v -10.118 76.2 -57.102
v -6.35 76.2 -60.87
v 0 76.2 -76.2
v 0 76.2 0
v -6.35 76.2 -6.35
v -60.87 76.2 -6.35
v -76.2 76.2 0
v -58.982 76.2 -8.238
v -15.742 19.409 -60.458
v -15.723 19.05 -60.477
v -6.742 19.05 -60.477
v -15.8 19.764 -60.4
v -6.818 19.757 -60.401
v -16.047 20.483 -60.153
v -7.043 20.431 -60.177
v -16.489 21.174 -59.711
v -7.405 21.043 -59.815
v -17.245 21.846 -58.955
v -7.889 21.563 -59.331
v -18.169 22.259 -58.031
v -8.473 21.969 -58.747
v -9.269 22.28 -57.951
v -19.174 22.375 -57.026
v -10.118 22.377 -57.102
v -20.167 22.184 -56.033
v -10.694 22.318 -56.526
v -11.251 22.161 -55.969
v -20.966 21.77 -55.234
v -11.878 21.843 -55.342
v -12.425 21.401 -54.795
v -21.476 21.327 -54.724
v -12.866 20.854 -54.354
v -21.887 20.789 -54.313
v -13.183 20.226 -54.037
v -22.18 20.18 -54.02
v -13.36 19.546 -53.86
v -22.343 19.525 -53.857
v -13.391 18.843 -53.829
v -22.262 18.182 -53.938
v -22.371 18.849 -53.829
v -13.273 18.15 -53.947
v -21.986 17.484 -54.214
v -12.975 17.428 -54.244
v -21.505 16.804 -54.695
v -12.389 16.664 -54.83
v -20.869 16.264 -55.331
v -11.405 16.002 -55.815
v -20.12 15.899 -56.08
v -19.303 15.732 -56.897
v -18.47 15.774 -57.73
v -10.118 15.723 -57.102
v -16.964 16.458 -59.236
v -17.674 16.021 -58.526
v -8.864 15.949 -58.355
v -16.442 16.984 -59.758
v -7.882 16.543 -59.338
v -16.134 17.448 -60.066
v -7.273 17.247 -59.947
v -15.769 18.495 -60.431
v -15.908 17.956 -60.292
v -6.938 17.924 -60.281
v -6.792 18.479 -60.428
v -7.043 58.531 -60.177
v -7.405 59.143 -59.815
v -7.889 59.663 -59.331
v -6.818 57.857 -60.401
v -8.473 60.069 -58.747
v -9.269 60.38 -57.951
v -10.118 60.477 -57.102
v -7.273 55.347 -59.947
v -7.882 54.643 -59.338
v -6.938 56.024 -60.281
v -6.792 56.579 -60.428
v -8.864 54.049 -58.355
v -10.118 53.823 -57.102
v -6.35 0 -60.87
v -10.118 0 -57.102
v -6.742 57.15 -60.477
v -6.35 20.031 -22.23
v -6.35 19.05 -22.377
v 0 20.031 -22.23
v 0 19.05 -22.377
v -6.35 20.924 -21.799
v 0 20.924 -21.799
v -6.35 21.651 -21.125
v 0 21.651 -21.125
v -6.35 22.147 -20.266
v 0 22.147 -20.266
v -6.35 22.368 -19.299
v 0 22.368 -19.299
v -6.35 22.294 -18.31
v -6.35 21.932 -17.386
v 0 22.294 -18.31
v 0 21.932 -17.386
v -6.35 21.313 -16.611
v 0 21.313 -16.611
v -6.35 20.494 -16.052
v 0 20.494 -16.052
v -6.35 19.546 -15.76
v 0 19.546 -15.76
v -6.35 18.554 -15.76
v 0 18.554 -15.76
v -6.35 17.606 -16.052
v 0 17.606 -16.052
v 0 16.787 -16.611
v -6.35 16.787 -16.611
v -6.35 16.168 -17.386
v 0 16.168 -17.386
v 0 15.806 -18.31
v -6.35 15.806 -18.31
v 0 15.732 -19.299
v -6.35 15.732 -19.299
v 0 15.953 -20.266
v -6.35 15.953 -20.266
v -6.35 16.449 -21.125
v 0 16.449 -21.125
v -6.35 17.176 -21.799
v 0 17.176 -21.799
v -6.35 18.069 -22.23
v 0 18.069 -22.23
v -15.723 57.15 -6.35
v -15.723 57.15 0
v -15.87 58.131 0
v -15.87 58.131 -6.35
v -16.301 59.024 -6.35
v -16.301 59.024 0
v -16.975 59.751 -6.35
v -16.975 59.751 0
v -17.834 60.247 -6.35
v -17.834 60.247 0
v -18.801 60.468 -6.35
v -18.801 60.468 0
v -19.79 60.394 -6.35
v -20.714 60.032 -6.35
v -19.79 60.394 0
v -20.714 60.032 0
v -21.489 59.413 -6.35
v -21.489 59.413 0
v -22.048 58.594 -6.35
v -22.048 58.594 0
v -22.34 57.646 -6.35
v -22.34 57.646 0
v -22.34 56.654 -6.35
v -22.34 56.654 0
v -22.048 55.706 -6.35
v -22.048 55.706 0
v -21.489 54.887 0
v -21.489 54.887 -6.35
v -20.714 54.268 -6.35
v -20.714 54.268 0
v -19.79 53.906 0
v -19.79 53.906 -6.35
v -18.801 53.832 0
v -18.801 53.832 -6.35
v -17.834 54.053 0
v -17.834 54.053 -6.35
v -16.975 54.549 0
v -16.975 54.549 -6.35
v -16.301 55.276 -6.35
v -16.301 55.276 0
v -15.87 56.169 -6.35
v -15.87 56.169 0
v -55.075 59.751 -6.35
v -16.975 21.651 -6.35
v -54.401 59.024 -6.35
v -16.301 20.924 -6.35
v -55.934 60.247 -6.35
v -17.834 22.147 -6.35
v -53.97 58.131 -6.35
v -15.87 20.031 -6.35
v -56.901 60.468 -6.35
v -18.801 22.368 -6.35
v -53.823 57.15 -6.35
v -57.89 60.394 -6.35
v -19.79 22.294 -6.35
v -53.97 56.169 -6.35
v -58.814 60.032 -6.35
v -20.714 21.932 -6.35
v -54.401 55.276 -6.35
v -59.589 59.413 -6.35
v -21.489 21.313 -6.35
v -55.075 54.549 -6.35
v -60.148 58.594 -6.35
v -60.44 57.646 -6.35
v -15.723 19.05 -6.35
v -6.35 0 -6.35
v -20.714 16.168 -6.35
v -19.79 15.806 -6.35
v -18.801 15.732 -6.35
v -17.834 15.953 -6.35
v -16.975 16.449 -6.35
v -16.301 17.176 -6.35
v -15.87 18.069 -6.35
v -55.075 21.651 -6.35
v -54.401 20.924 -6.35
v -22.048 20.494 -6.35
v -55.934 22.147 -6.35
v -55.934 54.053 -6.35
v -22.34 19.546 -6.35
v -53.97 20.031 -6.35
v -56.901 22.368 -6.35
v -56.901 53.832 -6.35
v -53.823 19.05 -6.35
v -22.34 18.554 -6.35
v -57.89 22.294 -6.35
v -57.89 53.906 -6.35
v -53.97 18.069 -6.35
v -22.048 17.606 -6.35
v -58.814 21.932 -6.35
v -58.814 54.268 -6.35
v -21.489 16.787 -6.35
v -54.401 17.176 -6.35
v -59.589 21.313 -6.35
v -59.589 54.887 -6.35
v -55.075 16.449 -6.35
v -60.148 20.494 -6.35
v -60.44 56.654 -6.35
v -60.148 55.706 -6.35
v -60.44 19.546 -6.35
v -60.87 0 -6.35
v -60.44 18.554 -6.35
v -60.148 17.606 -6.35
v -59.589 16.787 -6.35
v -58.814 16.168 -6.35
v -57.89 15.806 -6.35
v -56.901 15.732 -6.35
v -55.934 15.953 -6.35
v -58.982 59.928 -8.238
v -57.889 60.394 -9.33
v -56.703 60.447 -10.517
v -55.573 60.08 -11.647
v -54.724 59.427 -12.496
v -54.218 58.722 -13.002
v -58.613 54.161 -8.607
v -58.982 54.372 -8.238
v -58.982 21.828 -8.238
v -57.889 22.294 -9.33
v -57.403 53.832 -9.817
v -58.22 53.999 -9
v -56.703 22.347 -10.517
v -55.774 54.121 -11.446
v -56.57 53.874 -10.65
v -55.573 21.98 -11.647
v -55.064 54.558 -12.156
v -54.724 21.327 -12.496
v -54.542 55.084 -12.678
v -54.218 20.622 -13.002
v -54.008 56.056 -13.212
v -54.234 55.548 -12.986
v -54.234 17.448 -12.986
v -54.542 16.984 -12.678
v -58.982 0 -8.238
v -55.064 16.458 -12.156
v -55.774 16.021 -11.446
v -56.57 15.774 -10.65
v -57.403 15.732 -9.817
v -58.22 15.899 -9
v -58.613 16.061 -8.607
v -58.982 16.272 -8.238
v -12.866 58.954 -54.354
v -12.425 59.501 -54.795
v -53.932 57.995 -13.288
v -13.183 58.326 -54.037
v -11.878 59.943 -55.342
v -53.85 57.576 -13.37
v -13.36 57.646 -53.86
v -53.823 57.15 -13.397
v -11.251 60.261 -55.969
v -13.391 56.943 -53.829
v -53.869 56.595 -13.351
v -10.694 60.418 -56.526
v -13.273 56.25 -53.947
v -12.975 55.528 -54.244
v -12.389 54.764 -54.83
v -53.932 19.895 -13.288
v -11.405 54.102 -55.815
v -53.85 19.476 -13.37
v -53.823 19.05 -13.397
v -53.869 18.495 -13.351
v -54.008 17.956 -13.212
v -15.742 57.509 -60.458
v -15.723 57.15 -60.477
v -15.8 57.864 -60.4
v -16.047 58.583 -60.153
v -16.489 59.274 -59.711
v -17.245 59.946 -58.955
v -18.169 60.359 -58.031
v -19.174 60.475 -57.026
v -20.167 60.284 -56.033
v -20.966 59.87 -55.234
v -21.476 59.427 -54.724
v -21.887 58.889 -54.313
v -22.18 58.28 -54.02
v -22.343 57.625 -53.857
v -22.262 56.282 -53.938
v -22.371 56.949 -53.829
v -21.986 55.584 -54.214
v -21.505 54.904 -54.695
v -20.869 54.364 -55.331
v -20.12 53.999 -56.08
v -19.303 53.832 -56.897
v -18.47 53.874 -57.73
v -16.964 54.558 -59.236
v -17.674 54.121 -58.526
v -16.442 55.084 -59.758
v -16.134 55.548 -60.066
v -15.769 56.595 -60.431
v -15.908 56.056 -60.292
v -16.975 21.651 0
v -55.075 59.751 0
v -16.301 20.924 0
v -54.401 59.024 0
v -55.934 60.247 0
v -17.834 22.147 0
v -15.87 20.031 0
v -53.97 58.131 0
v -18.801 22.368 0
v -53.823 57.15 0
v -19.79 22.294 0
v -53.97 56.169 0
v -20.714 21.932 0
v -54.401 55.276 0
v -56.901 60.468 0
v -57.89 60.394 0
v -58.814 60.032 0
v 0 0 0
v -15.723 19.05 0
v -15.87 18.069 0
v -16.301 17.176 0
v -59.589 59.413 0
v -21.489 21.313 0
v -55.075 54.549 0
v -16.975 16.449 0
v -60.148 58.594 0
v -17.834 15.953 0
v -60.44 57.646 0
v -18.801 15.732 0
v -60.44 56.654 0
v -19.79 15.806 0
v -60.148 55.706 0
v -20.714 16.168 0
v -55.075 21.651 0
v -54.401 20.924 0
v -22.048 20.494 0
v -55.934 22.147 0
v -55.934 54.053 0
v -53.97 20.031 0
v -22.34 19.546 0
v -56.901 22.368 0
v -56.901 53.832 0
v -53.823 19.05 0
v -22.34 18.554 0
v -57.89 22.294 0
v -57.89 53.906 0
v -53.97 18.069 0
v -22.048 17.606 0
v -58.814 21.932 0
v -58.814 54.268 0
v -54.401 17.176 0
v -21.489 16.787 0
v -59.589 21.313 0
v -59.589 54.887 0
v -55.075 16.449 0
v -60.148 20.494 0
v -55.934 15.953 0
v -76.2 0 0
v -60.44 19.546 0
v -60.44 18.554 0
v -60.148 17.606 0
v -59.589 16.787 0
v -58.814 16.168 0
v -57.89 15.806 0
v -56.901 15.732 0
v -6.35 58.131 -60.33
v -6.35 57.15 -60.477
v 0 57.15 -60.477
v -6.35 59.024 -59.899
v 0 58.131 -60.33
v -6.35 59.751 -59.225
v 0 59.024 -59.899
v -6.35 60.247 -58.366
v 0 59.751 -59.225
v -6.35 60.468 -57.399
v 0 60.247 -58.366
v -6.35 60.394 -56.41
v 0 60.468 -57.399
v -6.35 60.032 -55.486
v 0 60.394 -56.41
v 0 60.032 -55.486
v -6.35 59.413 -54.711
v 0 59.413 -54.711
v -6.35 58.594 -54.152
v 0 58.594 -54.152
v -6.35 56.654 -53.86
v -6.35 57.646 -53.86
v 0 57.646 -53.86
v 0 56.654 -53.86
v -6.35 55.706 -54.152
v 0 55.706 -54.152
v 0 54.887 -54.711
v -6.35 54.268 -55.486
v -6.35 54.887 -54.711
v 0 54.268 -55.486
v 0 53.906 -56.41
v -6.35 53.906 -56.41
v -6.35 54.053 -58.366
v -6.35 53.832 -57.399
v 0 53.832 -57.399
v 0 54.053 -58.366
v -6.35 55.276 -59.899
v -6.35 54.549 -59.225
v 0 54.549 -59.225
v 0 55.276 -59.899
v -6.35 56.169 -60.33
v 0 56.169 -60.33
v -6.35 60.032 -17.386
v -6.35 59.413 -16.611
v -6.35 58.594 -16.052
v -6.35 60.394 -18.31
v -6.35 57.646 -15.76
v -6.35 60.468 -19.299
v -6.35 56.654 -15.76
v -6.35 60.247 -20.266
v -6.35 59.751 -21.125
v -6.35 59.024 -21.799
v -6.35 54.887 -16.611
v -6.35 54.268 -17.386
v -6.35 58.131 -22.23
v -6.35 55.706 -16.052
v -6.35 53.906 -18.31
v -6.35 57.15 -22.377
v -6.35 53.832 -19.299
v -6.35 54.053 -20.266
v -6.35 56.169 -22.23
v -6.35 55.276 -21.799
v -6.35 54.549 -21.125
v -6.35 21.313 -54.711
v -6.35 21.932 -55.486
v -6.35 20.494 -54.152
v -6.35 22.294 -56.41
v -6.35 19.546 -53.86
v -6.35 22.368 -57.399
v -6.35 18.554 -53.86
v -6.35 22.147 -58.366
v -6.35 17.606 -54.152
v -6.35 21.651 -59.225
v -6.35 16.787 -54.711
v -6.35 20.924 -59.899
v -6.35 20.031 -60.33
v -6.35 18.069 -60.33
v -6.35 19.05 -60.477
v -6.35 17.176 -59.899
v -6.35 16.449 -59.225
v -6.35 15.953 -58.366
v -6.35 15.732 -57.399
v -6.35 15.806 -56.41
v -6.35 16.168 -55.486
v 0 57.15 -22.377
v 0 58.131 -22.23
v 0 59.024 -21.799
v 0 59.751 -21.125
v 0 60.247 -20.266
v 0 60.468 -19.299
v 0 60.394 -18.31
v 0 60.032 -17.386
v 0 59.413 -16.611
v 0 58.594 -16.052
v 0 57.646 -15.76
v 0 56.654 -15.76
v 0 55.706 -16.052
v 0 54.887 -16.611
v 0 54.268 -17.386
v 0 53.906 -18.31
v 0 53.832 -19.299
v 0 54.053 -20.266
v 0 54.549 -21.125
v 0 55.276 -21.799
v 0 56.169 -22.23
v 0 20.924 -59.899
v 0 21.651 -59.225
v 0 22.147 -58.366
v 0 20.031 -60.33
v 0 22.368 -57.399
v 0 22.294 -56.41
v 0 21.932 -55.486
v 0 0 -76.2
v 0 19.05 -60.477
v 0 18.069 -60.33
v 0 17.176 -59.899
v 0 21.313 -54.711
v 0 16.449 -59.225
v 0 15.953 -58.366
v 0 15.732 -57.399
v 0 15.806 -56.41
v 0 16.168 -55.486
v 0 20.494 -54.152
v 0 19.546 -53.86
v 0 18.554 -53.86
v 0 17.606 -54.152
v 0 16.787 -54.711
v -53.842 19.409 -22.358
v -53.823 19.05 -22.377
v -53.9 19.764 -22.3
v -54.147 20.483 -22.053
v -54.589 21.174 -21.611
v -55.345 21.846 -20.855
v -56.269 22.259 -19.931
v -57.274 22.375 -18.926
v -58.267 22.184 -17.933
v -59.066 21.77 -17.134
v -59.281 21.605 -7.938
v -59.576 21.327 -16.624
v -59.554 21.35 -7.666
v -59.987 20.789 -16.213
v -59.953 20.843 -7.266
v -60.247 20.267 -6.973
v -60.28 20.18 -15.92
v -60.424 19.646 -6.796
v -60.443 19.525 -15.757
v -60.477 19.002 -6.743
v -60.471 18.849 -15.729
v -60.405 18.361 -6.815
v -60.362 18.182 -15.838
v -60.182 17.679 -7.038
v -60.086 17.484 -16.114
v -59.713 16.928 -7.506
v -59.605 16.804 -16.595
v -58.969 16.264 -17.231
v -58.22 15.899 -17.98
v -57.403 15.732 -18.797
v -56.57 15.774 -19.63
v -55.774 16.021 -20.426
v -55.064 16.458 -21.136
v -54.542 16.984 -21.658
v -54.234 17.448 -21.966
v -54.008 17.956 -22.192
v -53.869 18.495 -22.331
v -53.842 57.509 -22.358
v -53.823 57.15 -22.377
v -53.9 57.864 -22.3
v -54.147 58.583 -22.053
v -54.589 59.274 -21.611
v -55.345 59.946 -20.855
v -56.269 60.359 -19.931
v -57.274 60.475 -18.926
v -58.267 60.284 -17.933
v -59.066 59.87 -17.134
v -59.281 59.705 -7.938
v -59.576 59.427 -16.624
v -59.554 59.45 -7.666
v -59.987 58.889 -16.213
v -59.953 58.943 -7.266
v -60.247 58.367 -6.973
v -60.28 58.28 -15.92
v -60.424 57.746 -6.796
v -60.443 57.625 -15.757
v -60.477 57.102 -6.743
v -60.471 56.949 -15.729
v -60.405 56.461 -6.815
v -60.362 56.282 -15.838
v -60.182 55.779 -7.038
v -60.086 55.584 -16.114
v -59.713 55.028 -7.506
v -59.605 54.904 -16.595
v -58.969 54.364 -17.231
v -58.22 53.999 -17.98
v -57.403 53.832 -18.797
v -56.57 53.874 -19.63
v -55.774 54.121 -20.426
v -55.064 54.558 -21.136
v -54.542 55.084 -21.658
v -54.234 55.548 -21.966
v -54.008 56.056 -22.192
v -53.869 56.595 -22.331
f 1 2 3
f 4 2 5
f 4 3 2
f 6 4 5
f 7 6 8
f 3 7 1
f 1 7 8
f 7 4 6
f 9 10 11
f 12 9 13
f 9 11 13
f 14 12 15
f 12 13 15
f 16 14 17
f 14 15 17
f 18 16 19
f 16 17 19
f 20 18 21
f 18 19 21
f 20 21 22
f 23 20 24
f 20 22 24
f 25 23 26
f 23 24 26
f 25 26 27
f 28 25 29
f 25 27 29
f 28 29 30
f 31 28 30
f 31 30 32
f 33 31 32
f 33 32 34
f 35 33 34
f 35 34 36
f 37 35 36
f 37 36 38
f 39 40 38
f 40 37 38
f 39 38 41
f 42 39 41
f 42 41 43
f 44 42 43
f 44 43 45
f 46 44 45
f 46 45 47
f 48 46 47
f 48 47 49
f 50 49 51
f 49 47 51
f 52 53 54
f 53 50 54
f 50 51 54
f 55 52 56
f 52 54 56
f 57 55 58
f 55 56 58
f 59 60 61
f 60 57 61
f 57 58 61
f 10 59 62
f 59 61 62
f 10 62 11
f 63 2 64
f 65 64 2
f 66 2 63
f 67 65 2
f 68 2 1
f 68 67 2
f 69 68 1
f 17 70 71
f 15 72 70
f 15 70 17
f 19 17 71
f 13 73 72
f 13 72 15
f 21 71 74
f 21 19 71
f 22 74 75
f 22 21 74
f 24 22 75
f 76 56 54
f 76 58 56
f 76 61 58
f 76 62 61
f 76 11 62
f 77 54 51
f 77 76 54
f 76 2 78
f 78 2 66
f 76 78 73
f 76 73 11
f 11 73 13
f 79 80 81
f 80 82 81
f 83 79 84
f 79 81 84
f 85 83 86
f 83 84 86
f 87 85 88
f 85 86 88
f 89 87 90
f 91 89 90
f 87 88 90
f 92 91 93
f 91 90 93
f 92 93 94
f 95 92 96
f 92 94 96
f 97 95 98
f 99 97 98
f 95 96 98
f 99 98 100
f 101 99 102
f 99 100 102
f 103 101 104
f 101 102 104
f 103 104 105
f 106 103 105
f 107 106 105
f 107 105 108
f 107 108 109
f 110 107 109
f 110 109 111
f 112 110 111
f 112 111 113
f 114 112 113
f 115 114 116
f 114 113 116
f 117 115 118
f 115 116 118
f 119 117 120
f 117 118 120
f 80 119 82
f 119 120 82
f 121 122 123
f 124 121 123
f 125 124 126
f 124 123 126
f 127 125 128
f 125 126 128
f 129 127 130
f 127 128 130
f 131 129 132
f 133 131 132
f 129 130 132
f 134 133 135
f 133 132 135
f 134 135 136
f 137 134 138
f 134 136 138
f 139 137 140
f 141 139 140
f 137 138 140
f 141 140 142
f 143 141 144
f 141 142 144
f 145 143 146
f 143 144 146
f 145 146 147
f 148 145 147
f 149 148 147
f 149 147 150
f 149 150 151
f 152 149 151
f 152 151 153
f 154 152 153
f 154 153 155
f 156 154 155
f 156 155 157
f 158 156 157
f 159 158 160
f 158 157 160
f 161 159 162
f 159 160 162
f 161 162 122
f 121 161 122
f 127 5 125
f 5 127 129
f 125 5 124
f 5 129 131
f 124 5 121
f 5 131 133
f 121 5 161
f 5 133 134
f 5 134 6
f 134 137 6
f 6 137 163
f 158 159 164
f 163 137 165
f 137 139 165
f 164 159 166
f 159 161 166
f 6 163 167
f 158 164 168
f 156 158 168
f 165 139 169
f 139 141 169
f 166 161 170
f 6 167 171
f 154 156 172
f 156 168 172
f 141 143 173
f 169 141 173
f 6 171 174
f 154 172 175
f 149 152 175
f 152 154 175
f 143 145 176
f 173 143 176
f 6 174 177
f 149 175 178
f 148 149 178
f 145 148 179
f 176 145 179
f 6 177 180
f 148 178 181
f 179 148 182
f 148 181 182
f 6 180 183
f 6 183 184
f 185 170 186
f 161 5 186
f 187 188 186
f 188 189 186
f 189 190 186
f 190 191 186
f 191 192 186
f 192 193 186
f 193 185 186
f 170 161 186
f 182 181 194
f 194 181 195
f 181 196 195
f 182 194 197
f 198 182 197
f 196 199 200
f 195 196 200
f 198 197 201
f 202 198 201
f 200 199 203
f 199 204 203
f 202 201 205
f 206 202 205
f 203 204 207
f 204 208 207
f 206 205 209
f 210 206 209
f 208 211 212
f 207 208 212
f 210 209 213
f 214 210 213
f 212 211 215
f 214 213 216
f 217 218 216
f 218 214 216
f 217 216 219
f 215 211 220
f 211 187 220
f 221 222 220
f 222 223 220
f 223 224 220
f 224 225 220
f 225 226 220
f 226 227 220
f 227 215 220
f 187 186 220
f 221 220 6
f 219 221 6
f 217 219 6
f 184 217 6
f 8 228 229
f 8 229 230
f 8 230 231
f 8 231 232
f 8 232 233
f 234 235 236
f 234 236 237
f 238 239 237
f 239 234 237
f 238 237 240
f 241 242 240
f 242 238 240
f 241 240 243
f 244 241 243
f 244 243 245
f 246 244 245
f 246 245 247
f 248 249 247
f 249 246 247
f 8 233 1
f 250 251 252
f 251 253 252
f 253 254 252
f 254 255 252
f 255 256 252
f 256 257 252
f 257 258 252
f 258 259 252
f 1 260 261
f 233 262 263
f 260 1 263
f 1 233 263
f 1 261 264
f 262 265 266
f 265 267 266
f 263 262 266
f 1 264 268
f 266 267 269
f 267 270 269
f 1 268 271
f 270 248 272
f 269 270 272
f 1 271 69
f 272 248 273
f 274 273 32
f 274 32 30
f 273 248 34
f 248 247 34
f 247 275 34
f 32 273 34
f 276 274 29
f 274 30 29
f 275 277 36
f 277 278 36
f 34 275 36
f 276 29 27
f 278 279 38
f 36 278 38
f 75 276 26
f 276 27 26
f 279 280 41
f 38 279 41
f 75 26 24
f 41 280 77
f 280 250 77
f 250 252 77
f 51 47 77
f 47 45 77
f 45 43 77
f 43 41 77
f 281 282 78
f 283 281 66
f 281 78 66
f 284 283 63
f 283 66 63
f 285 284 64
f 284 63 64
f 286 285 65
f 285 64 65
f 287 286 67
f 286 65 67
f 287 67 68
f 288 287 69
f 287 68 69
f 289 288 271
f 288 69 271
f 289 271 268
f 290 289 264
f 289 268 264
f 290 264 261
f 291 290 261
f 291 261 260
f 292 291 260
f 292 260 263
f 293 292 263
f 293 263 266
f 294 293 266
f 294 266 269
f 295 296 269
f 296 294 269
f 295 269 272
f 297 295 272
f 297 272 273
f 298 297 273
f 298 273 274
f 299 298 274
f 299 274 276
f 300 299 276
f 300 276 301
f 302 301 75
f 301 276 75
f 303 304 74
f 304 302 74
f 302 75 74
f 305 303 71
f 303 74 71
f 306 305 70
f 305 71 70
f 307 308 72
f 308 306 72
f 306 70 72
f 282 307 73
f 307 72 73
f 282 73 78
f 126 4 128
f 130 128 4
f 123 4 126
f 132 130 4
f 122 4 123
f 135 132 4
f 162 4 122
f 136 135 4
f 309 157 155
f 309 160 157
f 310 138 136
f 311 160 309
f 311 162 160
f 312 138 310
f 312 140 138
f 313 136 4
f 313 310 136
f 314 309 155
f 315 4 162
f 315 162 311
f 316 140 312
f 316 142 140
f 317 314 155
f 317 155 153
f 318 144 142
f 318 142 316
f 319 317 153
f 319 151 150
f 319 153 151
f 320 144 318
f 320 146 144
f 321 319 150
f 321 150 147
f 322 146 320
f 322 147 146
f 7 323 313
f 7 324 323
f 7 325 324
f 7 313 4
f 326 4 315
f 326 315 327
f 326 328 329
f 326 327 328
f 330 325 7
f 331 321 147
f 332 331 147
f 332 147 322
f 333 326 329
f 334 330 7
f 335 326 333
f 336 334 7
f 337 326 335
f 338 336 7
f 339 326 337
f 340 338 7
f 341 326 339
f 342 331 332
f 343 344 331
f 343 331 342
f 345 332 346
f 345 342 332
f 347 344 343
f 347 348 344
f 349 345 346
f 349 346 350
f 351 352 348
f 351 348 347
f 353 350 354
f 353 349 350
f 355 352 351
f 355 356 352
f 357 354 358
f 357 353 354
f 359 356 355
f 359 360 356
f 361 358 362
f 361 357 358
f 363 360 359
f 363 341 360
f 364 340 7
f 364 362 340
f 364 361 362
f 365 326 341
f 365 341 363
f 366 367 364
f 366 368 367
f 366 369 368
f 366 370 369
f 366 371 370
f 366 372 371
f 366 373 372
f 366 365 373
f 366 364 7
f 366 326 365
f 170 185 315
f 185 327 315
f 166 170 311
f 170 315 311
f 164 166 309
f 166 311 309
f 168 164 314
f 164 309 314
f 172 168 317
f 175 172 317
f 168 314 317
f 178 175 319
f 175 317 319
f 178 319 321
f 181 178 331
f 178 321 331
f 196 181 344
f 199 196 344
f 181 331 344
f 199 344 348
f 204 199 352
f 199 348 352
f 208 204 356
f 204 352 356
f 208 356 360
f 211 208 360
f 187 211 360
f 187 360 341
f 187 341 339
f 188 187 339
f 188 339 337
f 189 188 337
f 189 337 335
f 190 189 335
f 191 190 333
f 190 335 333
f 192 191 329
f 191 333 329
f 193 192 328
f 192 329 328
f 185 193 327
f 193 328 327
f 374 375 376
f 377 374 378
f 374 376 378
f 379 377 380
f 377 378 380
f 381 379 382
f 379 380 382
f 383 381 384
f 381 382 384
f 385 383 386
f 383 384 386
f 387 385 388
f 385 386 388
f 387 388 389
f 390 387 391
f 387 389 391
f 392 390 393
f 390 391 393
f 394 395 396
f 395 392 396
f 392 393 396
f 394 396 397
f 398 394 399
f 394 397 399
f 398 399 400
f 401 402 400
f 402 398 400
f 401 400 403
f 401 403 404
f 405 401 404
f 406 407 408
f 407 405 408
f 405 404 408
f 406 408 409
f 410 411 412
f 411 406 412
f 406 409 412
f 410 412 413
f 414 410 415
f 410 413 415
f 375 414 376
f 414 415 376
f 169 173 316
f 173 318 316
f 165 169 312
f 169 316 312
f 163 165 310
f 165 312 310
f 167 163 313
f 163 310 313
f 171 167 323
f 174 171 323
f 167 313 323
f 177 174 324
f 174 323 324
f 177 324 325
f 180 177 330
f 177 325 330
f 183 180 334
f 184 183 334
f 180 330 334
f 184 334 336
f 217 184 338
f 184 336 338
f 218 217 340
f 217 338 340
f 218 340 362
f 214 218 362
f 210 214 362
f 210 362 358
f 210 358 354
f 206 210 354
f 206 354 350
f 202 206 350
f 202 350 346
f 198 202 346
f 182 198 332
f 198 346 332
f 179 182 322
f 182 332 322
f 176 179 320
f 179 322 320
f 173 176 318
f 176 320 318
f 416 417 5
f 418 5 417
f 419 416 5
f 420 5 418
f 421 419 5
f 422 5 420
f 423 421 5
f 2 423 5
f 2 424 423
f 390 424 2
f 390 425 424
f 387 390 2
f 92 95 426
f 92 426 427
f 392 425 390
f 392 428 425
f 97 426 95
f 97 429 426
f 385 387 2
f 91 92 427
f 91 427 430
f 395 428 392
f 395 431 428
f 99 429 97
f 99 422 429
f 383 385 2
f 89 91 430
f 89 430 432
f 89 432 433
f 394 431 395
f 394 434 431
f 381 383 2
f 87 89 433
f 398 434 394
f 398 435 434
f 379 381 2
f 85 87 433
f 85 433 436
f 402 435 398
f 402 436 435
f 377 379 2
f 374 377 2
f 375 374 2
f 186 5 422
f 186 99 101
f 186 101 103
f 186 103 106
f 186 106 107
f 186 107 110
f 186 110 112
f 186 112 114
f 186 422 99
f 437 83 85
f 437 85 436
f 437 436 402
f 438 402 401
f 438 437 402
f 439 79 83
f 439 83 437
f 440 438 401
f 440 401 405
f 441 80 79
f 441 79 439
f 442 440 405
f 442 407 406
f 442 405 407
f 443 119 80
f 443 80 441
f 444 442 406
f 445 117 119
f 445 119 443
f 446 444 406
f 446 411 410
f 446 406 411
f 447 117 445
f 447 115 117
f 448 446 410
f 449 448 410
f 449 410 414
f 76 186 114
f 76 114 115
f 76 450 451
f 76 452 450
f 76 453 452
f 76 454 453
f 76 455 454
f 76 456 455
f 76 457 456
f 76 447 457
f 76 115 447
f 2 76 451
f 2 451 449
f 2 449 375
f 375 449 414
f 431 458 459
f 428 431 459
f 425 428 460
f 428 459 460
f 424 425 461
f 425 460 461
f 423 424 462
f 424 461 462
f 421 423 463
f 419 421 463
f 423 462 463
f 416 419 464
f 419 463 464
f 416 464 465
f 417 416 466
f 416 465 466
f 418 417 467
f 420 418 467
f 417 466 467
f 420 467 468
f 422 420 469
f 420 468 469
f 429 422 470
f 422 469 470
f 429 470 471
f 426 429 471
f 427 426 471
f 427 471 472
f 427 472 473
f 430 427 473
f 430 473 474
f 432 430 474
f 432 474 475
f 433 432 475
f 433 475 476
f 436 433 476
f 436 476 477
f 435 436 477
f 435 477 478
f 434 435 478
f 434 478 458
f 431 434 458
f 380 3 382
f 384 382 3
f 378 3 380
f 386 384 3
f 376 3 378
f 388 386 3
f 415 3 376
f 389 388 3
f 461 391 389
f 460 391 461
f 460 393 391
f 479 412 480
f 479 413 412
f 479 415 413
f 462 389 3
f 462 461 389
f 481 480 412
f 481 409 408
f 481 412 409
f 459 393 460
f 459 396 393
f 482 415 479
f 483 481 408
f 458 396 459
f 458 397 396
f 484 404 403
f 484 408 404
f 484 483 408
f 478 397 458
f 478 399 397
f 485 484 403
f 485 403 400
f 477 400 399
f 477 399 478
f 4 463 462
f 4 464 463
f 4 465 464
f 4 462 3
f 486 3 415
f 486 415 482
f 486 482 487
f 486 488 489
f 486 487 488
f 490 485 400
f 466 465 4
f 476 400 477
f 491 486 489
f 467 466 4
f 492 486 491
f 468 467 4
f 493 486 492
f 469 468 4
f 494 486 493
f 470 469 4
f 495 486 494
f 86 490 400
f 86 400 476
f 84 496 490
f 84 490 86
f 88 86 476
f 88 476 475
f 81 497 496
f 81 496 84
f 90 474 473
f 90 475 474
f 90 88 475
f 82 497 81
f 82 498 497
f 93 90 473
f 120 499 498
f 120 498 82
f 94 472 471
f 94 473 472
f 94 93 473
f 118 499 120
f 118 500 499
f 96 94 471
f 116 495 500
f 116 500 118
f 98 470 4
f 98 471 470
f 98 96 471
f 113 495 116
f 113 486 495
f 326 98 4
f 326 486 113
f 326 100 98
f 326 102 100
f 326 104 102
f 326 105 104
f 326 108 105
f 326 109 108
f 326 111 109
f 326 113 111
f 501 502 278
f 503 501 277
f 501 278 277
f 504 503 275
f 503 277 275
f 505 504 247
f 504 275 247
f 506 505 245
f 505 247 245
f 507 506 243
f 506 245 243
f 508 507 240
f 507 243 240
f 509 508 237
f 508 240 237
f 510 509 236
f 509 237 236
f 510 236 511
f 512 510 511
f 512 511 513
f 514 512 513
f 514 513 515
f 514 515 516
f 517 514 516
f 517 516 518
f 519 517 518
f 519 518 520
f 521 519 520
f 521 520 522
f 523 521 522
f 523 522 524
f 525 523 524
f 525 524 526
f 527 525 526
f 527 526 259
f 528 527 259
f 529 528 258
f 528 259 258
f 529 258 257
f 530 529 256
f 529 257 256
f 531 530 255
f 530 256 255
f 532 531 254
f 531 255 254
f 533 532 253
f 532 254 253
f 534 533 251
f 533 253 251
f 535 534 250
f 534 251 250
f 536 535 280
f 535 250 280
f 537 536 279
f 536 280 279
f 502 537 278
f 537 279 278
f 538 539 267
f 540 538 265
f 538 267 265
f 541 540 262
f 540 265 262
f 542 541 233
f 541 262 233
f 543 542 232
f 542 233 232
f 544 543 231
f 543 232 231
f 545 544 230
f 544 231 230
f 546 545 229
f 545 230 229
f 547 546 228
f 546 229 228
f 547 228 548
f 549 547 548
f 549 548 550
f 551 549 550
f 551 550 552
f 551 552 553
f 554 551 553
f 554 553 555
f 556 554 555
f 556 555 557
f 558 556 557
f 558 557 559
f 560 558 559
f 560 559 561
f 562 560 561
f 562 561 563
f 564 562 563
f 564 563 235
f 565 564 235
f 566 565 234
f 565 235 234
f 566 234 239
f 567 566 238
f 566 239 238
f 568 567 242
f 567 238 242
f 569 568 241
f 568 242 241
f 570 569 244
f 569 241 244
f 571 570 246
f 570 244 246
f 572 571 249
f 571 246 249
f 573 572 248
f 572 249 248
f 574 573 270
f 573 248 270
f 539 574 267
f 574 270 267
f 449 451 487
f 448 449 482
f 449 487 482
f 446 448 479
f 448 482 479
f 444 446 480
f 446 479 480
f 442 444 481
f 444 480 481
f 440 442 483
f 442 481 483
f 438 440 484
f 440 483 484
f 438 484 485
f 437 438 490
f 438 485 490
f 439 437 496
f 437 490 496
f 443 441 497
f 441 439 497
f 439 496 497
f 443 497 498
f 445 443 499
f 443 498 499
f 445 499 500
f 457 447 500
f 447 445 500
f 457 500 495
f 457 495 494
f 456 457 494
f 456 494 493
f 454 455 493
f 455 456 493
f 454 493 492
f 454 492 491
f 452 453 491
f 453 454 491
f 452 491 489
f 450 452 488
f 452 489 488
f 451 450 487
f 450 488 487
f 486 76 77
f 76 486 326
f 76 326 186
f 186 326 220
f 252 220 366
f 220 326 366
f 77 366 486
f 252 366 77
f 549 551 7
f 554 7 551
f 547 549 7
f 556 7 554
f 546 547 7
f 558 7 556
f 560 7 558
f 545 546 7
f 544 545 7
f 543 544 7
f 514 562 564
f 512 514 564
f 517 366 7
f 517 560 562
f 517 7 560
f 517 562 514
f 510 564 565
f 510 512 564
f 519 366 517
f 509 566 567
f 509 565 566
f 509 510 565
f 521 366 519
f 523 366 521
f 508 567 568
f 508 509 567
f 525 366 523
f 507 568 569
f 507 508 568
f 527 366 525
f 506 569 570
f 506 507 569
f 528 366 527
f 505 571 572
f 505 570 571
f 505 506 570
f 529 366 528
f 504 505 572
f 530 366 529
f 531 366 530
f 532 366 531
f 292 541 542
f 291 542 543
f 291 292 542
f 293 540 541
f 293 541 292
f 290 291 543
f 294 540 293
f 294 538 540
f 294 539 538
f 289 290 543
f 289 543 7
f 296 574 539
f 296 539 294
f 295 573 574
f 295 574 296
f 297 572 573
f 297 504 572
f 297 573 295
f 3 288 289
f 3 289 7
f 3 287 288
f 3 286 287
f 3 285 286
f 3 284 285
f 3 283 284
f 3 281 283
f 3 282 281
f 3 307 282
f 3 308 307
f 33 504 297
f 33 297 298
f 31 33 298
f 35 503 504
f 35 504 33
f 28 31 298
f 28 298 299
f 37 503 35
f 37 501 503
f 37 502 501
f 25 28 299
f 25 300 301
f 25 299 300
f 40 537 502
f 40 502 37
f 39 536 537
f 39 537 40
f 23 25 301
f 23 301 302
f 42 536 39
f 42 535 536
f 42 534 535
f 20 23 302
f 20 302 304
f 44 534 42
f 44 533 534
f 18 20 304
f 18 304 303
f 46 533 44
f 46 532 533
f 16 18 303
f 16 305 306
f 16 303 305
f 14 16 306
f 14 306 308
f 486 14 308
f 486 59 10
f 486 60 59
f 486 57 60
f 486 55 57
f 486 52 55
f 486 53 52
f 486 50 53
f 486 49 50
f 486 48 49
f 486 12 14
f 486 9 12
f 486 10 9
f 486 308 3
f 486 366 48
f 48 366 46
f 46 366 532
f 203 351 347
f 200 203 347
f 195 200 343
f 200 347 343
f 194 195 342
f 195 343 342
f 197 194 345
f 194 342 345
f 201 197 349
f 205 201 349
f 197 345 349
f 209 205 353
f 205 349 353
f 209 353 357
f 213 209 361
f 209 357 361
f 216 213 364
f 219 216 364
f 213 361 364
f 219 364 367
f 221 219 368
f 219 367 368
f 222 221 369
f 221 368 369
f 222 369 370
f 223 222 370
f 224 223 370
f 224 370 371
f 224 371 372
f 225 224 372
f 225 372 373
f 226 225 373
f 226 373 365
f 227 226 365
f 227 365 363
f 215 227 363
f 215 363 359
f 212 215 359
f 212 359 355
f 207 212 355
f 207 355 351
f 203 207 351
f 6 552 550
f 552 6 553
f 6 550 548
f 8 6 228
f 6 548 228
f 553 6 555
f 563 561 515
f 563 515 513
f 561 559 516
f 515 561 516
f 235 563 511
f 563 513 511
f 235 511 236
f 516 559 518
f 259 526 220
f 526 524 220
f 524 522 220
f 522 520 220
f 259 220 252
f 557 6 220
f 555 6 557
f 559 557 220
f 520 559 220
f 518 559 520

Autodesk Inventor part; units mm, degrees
ref_plane "YZ Plane" through (0, 0, 0) normal (1, 0, 0) x (0, 1, 0)
ref_plane "XZ Plane" through (0, 0, 0) normal (0, 1, 0) x (-1, 0, 0)
ref_plane "XY Plane" through (0, 0, 0) normal (0, 0, 1) x (1, 0, 0)
sketch "Sketch1" plane through (0, 0, 0) normal (0, 1, 0) x (-1, 0, 0)
  line L0 (0, 0) -> (76.2, 0)
  line L1 (0, -76.2) -> (0, 0)
  line L2 (76.2, 0) -> (0, -76.2)
  line L3 (6.35, -6.35) -> (6.35, -58.8833)
  line L4 (58.982, -8.2377) -> (10.1183, -57.1015)
  line L5 (6.35, -6.35) -> (60.8697, -6.35)
  line L6 (60.8697, -6.35) -> (58.982, -8.2377)
  line L7 (6.35, -58.8833) -> (6.35, -60.8697)
  line L8 (6.35, -60.8697) -> (10.1183, -57.1015)
  dimension "d5" = 76.2
  dimension "d6" = 76.2
  dimension "d7" = 6.35
  dimension "d9" = 6.35
extrude "Extrusion1" add sketch "Sketch1" along normal blind 76.2
sketch "Sketch2" plane through (0, 0, 0) normal (1, 0, 0) x (0, 0, -1)
  circle A0 centre (19.05, 19.05) radius 3.3274
  circle A1 centre (57.15, 19.05) radius 3.3274
  circle A2 centre (57.15, 57.15) radius 3.3274
  circle A3 centre (19.05, 57.15) radius 3.3274
  line L0 (0, 76.2) -> (76.2, 76.2) projected
  line L1 (76.2, 0) -> (76.2, 76.2) projected
  line L2 (76.2, 0) -> (0, 0) projected
  line L3 (0, 0) -> (0, 76.2) projected
  dimension "d12" = 6.6548
  dimension "d13" = 6.6548
  dimension "d14" = 6.6548
  dimension "d15" = 6.6548
  dimension "d16" = 19.05
  dimension "d17" = 19.05
  dimension "d18" = 19.05
  dimension "d19" = 19.05
  dimension "d20" = 19.05
  dimension "d21" = 19.05
  dimension "d22" = 19.05
  dimension "d23" = 19.05
extrude "Extrusion2" cut sketch "Sketch2" against normal blind 25.4 contours A0 | A1 | A2 | A3
sketch "Sketch3" plane through (-76.2, 0, 0) normal (0, 0, 1) x (1, 0, 0)
  circle A0 centre (57.15, 19.05) radius 3.3274
  circle A1 centre (19.05, 19.05) radius 3.3274
  circle A2 centre (19.05, 57.15) radius 3.3274
  circle A3 centre (57.15, 57.15) radius 3.3274
  line L0 (76.2, 0) -> (0, 0) projected
  line L1 (76.2, 0) -> (76.2, 76.2) projected
  line L2 (0, 76.2) -> (76.2, 76.2) projected
  line L3 (0, 0) -> (0, 76.2) projected
  dimension "d26" = 6.6548
  dimension "d27" = 6.6548
  dimension "d28" = 6.6548
  dimension "d29" = 6.6548
  dimension "d30" = 19.05
  dimension "d31" = 19.05
  dimension "d32" = 19.05
  dimension "d33" = 19.05
  dimension "d34" = 19.05
  dimension "d35" = 19.05
  dimension "d36" = 19.05
  dimension "d37" = 19.05
extrude "Extrusion3" cut sketch "Sketch3" against normal blind 25.4 contours A0 | A1 | A2 | A3
properties part number "15series_3inchCorner"
